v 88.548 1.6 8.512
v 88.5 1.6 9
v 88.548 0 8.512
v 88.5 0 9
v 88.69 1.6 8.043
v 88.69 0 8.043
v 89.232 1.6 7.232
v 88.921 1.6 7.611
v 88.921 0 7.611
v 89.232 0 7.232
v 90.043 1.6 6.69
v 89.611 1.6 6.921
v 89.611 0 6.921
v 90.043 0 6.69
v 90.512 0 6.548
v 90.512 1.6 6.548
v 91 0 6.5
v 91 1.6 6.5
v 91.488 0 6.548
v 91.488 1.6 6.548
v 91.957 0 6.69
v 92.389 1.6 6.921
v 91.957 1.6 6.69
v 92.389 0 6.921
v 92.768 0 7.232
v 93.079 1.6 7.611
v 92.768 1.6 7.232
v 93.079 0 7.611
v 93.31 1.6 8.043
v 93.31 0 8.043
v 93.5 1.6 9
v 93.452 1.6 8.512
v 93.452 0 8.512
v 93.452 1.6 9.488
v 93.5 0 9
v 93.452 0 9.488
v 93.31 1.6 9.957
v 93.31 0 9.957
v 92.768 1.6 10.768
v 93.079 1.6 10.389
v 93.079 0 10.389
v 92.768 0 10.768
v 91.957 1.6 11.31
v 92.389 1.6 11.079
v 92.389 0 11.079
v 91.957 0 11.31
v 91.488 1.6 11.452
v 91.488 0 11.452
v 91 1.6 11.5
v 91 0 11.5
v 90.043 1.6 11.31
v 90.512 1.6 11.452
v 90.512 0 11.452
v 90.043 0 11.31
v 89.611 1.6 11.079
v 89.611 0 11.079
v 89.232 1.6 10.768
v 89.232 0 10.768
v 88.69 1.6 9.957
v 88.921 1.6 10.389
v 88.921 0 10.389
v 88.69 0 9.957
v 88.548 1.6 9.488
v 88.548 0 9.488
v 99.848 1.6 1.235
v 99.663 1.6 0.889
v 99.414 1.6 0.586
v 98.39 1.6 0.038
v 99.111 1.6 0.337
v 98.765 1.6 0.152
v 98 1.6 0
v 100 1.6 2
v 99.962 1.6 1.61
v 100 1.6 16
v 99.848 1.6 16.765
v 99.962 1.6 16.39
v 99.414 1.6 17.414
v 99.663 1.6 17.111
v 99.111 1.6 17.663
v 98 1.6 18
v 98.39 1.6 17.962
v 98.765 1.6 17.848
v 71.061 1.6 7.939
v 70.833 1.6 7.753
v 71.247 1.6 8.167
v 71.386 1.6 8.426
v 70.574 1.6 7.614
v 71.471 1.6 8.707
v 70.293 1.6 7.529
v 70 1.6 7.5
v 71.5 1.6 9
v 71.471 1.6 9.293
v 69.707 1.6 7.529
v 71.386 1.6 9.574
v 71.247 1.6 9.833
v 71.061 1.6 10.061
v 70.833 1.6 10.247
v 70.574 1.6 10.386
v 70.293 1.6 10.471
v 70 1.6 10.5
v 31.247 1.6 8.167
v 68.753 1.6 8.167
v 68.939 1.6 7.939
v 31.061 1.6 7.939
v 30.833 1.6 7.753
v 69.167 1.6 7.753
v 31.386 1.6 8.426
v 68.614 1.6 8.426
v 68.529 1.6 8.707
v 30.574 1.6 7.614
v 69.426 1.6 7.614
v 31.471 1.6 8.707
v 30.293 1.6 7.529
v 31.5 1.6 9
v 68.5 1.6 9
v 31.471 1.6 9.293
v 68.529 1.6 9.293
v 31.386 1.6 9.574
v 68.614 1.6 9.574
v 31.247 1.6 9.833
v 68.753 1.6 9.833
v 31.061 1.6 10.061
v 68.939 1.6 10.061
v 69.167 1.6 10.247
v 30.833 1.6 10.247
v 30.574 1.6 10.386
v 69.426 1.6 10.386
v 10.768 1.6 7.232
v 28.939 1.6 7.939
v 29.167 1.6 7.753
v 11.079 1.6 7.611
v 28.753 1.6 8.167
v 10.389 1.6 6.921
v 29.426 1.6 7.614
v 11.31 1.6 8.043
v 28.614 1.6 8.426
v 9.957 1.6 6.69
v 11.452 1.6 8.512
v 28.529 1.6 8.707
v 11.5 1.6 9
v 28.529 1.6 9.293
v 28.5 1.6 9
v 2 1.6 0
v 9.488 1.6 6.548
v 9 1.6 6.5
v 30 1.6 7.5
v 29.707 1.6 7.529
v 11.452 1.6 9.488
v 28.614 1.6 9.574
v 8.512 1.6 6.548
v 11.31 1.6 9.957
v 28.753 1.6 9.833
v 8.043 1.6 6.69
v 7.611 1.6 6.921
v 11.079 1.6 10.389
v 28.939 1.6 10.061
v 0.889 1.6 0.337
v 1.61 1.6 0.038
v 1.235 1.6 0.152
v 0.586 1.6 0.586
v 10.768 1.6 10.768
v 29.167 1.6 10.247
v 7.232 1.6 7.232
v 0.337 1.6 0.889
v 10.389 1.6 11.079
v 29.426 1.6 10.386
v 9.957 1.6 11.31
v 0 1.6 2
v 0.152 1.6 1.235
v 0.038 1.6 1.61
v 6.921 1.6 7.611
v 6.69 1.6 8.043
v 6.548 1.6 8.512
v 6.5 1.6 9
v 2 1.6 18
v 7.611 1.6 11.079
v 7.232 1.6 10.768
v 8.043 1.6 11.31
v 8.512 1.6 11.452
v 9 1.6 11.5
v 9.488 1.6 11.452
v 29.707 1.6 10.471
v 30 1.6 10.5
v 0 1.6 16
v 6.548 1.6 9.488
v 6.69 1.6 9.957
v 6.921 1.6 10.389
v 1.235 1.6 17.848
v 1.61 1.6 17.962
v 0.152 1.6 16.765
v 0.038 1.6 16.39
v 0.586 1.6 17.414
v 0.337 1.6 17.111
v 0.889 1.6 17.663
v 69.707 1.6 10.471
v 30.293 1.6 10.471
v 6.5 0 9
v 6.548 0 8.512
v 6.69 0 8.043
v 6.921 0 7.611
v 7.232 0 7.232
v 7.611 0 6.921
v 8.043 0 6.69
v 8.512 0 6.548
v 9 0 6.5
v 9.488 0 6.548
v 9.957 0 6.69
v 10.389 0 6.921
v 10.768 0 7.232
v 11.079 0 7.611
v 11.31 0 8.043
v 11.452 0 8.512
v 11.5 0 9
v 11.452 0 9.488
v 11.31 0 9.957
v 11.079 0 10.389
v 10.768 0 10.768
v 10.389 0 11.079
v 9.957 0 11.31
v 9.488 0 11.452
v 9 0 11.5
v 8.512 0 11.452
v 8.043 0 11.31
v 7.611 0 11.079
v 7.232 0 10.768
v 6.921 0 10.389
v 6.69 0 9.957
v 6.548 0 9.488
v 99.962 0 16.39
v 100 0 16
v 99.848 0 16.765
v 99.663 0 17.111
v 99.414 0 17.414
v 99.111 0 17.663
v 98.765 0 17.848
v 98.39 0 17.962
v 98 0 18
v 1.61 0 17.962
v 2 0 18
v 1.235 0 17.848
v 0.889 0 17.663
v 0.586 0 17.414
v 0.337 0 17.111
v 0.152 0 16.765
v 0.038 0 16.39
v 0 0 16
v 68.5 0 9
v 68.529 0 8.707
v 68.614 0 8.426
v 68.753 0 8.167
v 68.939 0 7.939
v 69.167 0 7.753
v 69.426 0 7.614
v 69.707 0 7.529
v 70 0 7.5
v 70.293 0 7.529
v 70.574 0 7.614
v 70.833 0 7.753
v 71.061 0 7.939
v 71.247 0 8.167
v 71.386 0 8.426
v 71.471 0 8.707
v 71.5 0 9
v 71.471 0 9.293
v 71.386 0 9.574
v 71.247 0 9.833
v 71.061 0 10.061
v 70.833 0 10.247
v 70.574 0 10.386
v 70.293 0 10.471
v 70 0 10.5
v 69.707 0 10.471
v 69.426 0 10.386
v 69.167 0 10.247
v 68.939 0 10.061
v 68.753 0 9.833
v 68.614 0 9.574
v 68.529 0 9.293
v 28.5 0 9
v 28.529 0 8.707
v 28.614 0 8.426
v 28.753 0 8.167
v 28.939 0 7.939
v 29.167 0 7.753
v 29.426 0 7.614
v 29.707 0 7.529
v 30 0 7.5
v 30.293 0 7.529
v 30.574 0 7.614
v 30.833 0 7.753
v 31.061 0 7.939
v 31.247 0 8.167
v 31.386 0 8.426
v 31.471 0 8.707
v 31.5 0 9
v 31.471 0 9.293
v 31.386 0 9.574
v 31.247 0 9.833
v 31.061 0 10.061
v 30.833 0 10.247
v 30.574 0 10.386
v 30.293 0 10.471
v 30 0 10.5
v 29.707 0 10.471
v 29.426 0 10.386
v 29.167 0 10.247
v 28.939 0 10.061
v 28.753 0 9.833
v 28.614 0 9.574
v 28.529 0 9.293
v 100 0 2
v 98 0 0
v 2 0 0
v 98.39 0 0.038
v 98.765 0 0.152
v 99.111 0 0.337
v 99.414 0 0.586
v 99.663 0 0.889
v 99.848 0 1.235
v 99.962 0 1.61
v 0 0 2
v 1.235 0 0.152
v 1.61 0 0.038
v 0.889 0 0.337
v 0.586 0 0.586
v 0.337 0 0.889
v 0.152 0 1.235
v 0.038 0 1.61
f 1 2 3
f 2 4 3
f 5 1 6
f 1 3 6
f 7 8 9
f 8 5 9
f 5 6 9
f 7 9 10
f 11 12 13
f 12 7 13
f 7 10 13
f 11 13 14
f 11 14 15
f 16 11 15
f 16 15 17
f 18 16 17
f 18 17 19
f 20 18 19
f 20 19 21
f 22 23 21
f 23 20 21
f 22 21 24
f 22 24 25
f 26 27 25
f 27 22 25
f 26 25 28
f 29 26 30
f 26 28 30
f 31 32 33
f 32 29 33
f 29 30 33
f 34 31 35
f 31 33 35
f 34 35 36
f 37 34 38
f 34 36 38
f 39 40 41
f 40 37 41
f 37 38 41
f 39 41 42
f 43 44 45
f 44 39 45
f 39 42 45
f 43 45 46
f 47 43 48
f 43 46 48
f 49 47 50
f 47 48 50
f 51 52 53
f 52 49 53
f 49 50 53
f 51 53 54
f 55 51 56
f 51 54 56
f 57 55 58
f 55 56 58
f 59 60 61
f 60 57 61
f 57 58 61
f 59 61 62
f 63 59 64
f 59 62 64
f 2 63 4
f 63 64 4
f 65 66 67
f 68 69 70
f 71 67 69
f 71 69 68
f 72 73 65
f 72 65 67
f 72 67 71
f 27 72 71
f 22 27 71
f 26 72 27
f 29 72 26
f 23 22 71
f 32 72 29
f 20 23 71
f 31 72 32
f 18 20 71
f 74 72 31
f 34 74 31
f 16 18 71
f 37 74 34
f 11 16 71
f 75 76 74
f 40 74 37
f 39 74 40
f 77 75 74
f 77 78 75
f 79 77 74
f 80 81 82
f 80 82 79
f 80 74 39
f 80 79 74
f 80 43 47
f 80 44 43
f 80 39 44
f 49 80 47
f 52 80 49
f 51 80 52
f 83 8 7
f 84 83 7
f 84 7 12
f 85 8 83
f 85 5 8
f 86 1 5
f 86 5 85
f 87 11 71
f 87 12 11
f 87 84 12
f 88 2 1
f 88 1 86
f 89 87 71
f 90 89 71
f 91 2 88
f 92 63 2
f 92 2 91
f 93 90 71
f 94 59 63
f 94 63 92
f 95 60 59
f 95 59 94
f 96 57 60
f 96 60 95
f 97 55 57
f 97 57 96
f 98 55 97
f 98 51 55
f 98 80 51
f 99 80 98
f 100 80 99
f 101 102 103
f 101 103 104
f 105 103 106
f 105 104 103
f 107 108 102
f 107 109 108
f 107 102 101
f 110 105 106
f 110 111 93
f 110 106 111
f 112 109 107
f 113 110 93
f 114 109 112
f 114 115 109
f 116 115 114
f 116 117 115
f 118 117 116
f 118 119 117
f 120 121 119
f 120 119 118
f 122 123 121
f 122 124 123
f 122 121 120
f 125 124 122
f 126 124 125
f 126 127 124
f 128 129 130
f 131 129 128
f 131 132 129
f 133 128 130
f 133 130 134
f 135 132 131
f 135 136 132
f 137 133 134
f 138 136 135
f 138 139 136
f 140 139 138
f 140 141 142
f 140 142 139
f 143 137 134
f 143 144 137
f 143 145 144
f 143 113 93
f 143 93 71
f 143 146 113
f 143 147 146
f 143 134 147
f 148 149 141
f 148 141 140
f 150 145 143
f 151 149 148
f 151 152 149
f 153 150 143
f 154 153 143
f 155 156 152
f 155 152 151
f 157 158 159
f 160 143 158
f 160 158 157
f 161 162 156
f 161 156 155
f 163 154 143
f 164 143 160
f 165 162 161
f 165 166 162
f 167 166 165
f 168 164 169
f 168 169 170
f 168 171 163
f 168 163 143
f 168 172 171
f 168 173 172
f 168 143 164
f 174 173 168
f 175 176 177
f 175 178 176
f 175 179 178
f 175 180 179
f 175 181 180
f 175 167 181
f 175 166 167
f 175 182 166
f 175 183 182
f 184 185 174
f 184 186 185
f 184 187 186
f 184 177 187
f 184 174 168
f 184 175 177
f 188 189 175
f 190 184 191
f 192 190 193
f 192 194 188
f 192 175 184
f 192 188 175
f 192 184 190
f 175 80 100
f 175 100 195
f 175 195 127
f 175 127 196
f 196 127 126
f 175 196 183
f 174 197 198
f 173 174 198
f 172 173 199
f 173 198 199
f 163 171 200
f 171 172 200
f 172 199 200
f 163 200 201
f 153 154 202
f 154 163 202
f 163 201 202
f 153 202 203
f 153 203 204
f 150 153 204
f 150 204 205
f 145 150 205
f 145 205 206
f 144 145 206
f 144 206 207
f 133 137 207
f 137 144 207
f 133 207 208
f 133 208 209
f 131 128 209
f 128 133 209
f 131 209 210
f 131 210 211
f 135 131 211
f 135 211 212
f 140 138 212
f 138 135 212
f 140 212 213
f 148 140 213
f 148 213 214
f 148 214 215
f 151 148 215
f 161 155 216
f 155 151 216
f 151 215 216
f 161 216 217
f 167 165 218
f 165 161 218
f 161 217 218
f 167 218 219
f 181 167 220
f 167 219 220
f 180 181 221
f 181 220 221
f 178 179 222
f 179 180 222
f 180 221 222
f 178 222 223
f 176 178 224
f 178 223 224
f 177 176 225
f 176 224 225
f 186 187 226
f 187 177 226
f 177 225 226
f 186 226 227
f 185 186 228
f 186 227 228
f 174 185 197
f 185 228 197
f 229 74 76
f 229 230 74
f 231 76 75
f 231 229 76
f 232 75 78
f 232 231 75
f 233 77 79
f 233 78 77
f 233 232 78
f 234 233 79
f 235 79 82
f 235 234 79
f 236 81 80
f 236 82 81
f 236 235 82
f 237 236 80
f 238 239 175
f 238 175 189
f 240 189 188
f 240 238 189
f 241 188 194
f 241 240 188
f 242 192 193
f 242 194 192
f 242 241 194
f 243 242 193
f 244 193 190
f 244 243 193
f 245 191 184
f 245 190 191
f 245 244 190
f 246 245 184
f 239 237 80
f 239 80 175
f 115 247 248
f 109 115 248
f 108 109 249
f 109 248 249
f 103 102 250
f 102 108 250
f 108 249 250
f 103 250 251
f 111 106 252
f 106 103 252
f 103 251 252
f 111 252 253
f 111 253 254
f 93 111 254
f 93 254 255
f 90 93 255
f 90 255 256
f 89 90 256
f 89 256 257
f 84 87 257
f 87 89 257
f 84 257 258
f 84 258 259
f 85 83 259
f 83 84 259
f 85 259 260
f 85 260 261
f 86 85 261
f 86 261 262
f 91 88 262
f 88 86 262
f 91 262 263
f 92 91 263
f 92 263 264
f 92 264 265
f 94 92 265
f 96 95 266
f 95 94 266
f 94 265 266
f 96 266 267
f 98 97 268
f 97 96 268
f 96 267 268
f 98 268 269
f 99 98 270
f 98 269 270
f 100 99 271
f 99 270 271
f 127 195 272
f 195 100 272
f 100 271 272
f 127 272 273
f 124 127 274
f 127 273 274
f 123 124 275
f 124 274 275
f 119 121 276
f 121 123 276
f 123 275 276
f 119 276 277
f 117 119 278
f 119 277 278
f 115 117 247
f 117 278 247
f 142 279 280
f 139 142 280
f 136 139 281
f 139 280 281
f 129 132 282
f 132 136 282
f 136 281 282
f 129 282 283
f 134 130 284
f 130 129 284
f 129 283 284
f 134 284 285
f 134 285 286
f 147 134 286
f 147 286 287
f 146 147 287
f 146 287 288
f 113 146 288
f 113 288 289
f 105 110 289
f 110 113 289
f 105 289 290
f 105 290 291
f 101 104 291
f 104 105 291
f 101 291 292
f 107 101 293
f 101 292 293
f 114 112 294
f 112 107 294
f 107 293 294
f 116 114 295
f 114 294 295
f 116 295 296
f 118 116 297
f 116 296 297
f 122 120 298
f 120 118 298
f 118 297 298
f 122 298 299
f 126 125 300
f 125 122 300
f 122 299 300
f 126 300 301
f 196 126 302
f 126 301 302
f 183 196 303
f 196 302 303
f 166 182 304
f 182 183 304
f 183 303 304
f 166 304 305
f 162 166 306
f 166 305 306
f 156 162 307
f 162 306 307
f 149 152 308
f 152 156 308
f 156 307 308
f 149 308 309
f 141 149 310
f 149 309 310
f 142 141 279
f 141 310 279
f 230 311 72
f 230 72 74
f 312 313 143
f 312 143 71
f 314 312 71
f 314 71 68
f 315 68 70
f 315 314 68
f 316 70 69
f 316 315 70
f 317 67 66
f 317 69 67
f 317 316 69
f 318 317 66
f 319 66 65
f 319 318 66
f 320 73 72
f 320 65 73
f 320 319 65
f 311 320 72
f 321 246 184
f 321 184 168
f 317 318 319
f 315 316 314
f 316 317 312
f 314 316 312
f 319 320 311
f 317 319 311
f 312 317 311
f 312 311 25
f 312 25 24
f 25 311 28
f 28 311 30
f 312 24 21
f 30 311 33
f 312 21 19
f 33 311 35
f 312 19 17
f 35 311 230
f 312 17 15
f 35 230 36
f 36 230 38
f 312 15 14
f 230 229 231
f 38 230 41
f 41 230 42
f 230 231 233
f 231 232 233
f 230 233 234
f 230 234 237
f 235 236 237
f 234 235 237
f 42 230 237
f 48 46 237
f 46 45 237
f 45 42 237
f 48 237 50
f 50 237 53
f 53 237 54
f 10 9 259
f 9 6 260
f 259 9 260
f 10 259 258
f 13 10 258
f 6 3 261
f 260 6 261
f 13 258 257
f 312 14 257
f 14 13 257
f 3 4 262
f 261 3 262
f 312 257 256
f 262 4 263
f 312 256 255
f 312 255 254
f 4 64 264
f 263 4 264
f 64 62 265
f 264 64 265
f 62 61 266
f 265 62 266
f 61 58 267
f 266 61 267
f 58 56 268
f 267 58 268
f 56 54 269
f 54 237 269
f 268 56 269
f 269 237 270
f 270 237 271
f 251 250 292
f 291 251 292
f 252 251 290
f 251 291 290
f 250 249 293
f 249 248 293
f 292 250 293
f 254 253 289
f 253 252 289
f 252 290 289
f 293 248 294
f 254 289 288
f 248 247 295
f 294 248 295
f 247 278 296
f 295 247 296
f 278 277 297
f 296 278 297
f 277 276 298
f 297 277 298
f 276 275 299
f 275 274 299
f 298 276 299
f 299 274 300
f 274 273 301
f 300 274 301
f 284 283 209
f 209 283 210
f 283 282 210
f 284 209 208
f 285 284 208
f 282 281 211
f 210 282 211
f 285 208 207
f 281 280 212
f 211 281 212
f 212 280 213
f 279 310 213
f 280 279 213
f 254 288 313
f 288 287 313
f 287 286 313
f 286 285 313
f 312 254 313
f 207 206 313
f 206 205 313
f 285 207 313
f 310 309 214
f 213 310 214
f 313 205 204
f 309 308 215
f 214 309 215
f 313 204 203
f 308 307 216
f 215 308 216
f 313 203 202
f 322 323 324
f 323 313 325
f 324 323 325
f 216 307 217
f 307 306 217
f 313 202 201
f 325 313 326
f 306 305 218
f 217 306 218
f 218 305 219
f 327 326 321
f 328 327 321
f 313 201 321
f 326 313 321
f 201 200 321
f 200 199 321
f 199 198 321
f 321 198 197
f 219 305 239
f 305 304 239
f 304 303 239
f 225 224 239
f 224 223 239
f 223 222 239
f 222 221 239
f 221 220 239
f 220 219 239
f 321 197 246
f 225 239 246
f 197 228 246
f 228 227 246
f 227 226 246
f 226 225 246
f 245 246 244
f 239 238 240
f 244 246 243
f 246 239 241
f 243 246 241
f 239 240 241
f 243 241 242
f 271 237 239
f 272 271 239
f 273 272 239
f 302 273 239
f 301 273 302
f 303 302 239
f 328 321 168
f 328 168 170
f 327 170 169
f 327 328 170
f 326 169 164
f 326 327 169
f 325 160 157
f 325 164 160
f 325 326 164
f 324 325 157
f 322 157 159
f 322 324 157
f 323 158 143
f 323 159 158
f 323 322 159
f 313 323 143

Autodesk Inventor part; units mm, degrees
ref_plane "YZ Plane" through (0, 0, 0) normal (1, 0, 0) x (0, 1, 0)
ref_plane "XZ Plane" through (0, 0, 0) normal (0, 1, 0) x (-1, 0, 0)
ref_plane "XY Plane" through (0, 0, 0) normal (0, 0, 1) x (1, 0, 0)
sketch "Szkic1" plane through (0, 0, 0) normal (0, 1, 0) x (-1, 0, 0)
  line L0 (-2, 0) -> (-98, 0)
  line L1 (-100, 2) -> (-100, 16)
  line L2 (-98, 18) -> (-2, 18)
  line L3 (0, 16) -> (0, 2)
  circle A0 centre (-9, 9) radius 2.5
  circle A1 centre (-30, 9) radius 1.5
  circle A2 centre (-91, 9) radius 2.5
  circle A3 centre (-70, 9) radius 1.5
  arc A4 (-2, 0) -> (0, 2) centre (-2, 2) ccw
  arc A5 (0, 16) -> (-2, 18) centre (-2, 16) ccw
  arc A6 (-100, 2) -> (-98, 0) centre (-98, 2) ccw
  arc A7 (-98, 18) -> (-100, 16) centre (-98, 16) ccw
  point P0 (0, 0)
  point P1 (-100, 18)
  point P2 (-100, 0)
  point P3 (0, 18)
  dimension "d0" = 100
  dimension "d1" = 18
  dimension "d2" = 5
  dimension "d3" = 9
  dimension "d4" = 9
  dimension "d5" = 3
  dimension "d6" = 9
  dimension "d7" = 30
  dimension "d8" = 2
extrude "Wyciągnięcie proste1" add sketch "Szkic1" along normal blind 1.6
equation "\"d4\" = 0.5 * d1"
equation "\"d6\" = d4"
properties part number "ramie1a"
